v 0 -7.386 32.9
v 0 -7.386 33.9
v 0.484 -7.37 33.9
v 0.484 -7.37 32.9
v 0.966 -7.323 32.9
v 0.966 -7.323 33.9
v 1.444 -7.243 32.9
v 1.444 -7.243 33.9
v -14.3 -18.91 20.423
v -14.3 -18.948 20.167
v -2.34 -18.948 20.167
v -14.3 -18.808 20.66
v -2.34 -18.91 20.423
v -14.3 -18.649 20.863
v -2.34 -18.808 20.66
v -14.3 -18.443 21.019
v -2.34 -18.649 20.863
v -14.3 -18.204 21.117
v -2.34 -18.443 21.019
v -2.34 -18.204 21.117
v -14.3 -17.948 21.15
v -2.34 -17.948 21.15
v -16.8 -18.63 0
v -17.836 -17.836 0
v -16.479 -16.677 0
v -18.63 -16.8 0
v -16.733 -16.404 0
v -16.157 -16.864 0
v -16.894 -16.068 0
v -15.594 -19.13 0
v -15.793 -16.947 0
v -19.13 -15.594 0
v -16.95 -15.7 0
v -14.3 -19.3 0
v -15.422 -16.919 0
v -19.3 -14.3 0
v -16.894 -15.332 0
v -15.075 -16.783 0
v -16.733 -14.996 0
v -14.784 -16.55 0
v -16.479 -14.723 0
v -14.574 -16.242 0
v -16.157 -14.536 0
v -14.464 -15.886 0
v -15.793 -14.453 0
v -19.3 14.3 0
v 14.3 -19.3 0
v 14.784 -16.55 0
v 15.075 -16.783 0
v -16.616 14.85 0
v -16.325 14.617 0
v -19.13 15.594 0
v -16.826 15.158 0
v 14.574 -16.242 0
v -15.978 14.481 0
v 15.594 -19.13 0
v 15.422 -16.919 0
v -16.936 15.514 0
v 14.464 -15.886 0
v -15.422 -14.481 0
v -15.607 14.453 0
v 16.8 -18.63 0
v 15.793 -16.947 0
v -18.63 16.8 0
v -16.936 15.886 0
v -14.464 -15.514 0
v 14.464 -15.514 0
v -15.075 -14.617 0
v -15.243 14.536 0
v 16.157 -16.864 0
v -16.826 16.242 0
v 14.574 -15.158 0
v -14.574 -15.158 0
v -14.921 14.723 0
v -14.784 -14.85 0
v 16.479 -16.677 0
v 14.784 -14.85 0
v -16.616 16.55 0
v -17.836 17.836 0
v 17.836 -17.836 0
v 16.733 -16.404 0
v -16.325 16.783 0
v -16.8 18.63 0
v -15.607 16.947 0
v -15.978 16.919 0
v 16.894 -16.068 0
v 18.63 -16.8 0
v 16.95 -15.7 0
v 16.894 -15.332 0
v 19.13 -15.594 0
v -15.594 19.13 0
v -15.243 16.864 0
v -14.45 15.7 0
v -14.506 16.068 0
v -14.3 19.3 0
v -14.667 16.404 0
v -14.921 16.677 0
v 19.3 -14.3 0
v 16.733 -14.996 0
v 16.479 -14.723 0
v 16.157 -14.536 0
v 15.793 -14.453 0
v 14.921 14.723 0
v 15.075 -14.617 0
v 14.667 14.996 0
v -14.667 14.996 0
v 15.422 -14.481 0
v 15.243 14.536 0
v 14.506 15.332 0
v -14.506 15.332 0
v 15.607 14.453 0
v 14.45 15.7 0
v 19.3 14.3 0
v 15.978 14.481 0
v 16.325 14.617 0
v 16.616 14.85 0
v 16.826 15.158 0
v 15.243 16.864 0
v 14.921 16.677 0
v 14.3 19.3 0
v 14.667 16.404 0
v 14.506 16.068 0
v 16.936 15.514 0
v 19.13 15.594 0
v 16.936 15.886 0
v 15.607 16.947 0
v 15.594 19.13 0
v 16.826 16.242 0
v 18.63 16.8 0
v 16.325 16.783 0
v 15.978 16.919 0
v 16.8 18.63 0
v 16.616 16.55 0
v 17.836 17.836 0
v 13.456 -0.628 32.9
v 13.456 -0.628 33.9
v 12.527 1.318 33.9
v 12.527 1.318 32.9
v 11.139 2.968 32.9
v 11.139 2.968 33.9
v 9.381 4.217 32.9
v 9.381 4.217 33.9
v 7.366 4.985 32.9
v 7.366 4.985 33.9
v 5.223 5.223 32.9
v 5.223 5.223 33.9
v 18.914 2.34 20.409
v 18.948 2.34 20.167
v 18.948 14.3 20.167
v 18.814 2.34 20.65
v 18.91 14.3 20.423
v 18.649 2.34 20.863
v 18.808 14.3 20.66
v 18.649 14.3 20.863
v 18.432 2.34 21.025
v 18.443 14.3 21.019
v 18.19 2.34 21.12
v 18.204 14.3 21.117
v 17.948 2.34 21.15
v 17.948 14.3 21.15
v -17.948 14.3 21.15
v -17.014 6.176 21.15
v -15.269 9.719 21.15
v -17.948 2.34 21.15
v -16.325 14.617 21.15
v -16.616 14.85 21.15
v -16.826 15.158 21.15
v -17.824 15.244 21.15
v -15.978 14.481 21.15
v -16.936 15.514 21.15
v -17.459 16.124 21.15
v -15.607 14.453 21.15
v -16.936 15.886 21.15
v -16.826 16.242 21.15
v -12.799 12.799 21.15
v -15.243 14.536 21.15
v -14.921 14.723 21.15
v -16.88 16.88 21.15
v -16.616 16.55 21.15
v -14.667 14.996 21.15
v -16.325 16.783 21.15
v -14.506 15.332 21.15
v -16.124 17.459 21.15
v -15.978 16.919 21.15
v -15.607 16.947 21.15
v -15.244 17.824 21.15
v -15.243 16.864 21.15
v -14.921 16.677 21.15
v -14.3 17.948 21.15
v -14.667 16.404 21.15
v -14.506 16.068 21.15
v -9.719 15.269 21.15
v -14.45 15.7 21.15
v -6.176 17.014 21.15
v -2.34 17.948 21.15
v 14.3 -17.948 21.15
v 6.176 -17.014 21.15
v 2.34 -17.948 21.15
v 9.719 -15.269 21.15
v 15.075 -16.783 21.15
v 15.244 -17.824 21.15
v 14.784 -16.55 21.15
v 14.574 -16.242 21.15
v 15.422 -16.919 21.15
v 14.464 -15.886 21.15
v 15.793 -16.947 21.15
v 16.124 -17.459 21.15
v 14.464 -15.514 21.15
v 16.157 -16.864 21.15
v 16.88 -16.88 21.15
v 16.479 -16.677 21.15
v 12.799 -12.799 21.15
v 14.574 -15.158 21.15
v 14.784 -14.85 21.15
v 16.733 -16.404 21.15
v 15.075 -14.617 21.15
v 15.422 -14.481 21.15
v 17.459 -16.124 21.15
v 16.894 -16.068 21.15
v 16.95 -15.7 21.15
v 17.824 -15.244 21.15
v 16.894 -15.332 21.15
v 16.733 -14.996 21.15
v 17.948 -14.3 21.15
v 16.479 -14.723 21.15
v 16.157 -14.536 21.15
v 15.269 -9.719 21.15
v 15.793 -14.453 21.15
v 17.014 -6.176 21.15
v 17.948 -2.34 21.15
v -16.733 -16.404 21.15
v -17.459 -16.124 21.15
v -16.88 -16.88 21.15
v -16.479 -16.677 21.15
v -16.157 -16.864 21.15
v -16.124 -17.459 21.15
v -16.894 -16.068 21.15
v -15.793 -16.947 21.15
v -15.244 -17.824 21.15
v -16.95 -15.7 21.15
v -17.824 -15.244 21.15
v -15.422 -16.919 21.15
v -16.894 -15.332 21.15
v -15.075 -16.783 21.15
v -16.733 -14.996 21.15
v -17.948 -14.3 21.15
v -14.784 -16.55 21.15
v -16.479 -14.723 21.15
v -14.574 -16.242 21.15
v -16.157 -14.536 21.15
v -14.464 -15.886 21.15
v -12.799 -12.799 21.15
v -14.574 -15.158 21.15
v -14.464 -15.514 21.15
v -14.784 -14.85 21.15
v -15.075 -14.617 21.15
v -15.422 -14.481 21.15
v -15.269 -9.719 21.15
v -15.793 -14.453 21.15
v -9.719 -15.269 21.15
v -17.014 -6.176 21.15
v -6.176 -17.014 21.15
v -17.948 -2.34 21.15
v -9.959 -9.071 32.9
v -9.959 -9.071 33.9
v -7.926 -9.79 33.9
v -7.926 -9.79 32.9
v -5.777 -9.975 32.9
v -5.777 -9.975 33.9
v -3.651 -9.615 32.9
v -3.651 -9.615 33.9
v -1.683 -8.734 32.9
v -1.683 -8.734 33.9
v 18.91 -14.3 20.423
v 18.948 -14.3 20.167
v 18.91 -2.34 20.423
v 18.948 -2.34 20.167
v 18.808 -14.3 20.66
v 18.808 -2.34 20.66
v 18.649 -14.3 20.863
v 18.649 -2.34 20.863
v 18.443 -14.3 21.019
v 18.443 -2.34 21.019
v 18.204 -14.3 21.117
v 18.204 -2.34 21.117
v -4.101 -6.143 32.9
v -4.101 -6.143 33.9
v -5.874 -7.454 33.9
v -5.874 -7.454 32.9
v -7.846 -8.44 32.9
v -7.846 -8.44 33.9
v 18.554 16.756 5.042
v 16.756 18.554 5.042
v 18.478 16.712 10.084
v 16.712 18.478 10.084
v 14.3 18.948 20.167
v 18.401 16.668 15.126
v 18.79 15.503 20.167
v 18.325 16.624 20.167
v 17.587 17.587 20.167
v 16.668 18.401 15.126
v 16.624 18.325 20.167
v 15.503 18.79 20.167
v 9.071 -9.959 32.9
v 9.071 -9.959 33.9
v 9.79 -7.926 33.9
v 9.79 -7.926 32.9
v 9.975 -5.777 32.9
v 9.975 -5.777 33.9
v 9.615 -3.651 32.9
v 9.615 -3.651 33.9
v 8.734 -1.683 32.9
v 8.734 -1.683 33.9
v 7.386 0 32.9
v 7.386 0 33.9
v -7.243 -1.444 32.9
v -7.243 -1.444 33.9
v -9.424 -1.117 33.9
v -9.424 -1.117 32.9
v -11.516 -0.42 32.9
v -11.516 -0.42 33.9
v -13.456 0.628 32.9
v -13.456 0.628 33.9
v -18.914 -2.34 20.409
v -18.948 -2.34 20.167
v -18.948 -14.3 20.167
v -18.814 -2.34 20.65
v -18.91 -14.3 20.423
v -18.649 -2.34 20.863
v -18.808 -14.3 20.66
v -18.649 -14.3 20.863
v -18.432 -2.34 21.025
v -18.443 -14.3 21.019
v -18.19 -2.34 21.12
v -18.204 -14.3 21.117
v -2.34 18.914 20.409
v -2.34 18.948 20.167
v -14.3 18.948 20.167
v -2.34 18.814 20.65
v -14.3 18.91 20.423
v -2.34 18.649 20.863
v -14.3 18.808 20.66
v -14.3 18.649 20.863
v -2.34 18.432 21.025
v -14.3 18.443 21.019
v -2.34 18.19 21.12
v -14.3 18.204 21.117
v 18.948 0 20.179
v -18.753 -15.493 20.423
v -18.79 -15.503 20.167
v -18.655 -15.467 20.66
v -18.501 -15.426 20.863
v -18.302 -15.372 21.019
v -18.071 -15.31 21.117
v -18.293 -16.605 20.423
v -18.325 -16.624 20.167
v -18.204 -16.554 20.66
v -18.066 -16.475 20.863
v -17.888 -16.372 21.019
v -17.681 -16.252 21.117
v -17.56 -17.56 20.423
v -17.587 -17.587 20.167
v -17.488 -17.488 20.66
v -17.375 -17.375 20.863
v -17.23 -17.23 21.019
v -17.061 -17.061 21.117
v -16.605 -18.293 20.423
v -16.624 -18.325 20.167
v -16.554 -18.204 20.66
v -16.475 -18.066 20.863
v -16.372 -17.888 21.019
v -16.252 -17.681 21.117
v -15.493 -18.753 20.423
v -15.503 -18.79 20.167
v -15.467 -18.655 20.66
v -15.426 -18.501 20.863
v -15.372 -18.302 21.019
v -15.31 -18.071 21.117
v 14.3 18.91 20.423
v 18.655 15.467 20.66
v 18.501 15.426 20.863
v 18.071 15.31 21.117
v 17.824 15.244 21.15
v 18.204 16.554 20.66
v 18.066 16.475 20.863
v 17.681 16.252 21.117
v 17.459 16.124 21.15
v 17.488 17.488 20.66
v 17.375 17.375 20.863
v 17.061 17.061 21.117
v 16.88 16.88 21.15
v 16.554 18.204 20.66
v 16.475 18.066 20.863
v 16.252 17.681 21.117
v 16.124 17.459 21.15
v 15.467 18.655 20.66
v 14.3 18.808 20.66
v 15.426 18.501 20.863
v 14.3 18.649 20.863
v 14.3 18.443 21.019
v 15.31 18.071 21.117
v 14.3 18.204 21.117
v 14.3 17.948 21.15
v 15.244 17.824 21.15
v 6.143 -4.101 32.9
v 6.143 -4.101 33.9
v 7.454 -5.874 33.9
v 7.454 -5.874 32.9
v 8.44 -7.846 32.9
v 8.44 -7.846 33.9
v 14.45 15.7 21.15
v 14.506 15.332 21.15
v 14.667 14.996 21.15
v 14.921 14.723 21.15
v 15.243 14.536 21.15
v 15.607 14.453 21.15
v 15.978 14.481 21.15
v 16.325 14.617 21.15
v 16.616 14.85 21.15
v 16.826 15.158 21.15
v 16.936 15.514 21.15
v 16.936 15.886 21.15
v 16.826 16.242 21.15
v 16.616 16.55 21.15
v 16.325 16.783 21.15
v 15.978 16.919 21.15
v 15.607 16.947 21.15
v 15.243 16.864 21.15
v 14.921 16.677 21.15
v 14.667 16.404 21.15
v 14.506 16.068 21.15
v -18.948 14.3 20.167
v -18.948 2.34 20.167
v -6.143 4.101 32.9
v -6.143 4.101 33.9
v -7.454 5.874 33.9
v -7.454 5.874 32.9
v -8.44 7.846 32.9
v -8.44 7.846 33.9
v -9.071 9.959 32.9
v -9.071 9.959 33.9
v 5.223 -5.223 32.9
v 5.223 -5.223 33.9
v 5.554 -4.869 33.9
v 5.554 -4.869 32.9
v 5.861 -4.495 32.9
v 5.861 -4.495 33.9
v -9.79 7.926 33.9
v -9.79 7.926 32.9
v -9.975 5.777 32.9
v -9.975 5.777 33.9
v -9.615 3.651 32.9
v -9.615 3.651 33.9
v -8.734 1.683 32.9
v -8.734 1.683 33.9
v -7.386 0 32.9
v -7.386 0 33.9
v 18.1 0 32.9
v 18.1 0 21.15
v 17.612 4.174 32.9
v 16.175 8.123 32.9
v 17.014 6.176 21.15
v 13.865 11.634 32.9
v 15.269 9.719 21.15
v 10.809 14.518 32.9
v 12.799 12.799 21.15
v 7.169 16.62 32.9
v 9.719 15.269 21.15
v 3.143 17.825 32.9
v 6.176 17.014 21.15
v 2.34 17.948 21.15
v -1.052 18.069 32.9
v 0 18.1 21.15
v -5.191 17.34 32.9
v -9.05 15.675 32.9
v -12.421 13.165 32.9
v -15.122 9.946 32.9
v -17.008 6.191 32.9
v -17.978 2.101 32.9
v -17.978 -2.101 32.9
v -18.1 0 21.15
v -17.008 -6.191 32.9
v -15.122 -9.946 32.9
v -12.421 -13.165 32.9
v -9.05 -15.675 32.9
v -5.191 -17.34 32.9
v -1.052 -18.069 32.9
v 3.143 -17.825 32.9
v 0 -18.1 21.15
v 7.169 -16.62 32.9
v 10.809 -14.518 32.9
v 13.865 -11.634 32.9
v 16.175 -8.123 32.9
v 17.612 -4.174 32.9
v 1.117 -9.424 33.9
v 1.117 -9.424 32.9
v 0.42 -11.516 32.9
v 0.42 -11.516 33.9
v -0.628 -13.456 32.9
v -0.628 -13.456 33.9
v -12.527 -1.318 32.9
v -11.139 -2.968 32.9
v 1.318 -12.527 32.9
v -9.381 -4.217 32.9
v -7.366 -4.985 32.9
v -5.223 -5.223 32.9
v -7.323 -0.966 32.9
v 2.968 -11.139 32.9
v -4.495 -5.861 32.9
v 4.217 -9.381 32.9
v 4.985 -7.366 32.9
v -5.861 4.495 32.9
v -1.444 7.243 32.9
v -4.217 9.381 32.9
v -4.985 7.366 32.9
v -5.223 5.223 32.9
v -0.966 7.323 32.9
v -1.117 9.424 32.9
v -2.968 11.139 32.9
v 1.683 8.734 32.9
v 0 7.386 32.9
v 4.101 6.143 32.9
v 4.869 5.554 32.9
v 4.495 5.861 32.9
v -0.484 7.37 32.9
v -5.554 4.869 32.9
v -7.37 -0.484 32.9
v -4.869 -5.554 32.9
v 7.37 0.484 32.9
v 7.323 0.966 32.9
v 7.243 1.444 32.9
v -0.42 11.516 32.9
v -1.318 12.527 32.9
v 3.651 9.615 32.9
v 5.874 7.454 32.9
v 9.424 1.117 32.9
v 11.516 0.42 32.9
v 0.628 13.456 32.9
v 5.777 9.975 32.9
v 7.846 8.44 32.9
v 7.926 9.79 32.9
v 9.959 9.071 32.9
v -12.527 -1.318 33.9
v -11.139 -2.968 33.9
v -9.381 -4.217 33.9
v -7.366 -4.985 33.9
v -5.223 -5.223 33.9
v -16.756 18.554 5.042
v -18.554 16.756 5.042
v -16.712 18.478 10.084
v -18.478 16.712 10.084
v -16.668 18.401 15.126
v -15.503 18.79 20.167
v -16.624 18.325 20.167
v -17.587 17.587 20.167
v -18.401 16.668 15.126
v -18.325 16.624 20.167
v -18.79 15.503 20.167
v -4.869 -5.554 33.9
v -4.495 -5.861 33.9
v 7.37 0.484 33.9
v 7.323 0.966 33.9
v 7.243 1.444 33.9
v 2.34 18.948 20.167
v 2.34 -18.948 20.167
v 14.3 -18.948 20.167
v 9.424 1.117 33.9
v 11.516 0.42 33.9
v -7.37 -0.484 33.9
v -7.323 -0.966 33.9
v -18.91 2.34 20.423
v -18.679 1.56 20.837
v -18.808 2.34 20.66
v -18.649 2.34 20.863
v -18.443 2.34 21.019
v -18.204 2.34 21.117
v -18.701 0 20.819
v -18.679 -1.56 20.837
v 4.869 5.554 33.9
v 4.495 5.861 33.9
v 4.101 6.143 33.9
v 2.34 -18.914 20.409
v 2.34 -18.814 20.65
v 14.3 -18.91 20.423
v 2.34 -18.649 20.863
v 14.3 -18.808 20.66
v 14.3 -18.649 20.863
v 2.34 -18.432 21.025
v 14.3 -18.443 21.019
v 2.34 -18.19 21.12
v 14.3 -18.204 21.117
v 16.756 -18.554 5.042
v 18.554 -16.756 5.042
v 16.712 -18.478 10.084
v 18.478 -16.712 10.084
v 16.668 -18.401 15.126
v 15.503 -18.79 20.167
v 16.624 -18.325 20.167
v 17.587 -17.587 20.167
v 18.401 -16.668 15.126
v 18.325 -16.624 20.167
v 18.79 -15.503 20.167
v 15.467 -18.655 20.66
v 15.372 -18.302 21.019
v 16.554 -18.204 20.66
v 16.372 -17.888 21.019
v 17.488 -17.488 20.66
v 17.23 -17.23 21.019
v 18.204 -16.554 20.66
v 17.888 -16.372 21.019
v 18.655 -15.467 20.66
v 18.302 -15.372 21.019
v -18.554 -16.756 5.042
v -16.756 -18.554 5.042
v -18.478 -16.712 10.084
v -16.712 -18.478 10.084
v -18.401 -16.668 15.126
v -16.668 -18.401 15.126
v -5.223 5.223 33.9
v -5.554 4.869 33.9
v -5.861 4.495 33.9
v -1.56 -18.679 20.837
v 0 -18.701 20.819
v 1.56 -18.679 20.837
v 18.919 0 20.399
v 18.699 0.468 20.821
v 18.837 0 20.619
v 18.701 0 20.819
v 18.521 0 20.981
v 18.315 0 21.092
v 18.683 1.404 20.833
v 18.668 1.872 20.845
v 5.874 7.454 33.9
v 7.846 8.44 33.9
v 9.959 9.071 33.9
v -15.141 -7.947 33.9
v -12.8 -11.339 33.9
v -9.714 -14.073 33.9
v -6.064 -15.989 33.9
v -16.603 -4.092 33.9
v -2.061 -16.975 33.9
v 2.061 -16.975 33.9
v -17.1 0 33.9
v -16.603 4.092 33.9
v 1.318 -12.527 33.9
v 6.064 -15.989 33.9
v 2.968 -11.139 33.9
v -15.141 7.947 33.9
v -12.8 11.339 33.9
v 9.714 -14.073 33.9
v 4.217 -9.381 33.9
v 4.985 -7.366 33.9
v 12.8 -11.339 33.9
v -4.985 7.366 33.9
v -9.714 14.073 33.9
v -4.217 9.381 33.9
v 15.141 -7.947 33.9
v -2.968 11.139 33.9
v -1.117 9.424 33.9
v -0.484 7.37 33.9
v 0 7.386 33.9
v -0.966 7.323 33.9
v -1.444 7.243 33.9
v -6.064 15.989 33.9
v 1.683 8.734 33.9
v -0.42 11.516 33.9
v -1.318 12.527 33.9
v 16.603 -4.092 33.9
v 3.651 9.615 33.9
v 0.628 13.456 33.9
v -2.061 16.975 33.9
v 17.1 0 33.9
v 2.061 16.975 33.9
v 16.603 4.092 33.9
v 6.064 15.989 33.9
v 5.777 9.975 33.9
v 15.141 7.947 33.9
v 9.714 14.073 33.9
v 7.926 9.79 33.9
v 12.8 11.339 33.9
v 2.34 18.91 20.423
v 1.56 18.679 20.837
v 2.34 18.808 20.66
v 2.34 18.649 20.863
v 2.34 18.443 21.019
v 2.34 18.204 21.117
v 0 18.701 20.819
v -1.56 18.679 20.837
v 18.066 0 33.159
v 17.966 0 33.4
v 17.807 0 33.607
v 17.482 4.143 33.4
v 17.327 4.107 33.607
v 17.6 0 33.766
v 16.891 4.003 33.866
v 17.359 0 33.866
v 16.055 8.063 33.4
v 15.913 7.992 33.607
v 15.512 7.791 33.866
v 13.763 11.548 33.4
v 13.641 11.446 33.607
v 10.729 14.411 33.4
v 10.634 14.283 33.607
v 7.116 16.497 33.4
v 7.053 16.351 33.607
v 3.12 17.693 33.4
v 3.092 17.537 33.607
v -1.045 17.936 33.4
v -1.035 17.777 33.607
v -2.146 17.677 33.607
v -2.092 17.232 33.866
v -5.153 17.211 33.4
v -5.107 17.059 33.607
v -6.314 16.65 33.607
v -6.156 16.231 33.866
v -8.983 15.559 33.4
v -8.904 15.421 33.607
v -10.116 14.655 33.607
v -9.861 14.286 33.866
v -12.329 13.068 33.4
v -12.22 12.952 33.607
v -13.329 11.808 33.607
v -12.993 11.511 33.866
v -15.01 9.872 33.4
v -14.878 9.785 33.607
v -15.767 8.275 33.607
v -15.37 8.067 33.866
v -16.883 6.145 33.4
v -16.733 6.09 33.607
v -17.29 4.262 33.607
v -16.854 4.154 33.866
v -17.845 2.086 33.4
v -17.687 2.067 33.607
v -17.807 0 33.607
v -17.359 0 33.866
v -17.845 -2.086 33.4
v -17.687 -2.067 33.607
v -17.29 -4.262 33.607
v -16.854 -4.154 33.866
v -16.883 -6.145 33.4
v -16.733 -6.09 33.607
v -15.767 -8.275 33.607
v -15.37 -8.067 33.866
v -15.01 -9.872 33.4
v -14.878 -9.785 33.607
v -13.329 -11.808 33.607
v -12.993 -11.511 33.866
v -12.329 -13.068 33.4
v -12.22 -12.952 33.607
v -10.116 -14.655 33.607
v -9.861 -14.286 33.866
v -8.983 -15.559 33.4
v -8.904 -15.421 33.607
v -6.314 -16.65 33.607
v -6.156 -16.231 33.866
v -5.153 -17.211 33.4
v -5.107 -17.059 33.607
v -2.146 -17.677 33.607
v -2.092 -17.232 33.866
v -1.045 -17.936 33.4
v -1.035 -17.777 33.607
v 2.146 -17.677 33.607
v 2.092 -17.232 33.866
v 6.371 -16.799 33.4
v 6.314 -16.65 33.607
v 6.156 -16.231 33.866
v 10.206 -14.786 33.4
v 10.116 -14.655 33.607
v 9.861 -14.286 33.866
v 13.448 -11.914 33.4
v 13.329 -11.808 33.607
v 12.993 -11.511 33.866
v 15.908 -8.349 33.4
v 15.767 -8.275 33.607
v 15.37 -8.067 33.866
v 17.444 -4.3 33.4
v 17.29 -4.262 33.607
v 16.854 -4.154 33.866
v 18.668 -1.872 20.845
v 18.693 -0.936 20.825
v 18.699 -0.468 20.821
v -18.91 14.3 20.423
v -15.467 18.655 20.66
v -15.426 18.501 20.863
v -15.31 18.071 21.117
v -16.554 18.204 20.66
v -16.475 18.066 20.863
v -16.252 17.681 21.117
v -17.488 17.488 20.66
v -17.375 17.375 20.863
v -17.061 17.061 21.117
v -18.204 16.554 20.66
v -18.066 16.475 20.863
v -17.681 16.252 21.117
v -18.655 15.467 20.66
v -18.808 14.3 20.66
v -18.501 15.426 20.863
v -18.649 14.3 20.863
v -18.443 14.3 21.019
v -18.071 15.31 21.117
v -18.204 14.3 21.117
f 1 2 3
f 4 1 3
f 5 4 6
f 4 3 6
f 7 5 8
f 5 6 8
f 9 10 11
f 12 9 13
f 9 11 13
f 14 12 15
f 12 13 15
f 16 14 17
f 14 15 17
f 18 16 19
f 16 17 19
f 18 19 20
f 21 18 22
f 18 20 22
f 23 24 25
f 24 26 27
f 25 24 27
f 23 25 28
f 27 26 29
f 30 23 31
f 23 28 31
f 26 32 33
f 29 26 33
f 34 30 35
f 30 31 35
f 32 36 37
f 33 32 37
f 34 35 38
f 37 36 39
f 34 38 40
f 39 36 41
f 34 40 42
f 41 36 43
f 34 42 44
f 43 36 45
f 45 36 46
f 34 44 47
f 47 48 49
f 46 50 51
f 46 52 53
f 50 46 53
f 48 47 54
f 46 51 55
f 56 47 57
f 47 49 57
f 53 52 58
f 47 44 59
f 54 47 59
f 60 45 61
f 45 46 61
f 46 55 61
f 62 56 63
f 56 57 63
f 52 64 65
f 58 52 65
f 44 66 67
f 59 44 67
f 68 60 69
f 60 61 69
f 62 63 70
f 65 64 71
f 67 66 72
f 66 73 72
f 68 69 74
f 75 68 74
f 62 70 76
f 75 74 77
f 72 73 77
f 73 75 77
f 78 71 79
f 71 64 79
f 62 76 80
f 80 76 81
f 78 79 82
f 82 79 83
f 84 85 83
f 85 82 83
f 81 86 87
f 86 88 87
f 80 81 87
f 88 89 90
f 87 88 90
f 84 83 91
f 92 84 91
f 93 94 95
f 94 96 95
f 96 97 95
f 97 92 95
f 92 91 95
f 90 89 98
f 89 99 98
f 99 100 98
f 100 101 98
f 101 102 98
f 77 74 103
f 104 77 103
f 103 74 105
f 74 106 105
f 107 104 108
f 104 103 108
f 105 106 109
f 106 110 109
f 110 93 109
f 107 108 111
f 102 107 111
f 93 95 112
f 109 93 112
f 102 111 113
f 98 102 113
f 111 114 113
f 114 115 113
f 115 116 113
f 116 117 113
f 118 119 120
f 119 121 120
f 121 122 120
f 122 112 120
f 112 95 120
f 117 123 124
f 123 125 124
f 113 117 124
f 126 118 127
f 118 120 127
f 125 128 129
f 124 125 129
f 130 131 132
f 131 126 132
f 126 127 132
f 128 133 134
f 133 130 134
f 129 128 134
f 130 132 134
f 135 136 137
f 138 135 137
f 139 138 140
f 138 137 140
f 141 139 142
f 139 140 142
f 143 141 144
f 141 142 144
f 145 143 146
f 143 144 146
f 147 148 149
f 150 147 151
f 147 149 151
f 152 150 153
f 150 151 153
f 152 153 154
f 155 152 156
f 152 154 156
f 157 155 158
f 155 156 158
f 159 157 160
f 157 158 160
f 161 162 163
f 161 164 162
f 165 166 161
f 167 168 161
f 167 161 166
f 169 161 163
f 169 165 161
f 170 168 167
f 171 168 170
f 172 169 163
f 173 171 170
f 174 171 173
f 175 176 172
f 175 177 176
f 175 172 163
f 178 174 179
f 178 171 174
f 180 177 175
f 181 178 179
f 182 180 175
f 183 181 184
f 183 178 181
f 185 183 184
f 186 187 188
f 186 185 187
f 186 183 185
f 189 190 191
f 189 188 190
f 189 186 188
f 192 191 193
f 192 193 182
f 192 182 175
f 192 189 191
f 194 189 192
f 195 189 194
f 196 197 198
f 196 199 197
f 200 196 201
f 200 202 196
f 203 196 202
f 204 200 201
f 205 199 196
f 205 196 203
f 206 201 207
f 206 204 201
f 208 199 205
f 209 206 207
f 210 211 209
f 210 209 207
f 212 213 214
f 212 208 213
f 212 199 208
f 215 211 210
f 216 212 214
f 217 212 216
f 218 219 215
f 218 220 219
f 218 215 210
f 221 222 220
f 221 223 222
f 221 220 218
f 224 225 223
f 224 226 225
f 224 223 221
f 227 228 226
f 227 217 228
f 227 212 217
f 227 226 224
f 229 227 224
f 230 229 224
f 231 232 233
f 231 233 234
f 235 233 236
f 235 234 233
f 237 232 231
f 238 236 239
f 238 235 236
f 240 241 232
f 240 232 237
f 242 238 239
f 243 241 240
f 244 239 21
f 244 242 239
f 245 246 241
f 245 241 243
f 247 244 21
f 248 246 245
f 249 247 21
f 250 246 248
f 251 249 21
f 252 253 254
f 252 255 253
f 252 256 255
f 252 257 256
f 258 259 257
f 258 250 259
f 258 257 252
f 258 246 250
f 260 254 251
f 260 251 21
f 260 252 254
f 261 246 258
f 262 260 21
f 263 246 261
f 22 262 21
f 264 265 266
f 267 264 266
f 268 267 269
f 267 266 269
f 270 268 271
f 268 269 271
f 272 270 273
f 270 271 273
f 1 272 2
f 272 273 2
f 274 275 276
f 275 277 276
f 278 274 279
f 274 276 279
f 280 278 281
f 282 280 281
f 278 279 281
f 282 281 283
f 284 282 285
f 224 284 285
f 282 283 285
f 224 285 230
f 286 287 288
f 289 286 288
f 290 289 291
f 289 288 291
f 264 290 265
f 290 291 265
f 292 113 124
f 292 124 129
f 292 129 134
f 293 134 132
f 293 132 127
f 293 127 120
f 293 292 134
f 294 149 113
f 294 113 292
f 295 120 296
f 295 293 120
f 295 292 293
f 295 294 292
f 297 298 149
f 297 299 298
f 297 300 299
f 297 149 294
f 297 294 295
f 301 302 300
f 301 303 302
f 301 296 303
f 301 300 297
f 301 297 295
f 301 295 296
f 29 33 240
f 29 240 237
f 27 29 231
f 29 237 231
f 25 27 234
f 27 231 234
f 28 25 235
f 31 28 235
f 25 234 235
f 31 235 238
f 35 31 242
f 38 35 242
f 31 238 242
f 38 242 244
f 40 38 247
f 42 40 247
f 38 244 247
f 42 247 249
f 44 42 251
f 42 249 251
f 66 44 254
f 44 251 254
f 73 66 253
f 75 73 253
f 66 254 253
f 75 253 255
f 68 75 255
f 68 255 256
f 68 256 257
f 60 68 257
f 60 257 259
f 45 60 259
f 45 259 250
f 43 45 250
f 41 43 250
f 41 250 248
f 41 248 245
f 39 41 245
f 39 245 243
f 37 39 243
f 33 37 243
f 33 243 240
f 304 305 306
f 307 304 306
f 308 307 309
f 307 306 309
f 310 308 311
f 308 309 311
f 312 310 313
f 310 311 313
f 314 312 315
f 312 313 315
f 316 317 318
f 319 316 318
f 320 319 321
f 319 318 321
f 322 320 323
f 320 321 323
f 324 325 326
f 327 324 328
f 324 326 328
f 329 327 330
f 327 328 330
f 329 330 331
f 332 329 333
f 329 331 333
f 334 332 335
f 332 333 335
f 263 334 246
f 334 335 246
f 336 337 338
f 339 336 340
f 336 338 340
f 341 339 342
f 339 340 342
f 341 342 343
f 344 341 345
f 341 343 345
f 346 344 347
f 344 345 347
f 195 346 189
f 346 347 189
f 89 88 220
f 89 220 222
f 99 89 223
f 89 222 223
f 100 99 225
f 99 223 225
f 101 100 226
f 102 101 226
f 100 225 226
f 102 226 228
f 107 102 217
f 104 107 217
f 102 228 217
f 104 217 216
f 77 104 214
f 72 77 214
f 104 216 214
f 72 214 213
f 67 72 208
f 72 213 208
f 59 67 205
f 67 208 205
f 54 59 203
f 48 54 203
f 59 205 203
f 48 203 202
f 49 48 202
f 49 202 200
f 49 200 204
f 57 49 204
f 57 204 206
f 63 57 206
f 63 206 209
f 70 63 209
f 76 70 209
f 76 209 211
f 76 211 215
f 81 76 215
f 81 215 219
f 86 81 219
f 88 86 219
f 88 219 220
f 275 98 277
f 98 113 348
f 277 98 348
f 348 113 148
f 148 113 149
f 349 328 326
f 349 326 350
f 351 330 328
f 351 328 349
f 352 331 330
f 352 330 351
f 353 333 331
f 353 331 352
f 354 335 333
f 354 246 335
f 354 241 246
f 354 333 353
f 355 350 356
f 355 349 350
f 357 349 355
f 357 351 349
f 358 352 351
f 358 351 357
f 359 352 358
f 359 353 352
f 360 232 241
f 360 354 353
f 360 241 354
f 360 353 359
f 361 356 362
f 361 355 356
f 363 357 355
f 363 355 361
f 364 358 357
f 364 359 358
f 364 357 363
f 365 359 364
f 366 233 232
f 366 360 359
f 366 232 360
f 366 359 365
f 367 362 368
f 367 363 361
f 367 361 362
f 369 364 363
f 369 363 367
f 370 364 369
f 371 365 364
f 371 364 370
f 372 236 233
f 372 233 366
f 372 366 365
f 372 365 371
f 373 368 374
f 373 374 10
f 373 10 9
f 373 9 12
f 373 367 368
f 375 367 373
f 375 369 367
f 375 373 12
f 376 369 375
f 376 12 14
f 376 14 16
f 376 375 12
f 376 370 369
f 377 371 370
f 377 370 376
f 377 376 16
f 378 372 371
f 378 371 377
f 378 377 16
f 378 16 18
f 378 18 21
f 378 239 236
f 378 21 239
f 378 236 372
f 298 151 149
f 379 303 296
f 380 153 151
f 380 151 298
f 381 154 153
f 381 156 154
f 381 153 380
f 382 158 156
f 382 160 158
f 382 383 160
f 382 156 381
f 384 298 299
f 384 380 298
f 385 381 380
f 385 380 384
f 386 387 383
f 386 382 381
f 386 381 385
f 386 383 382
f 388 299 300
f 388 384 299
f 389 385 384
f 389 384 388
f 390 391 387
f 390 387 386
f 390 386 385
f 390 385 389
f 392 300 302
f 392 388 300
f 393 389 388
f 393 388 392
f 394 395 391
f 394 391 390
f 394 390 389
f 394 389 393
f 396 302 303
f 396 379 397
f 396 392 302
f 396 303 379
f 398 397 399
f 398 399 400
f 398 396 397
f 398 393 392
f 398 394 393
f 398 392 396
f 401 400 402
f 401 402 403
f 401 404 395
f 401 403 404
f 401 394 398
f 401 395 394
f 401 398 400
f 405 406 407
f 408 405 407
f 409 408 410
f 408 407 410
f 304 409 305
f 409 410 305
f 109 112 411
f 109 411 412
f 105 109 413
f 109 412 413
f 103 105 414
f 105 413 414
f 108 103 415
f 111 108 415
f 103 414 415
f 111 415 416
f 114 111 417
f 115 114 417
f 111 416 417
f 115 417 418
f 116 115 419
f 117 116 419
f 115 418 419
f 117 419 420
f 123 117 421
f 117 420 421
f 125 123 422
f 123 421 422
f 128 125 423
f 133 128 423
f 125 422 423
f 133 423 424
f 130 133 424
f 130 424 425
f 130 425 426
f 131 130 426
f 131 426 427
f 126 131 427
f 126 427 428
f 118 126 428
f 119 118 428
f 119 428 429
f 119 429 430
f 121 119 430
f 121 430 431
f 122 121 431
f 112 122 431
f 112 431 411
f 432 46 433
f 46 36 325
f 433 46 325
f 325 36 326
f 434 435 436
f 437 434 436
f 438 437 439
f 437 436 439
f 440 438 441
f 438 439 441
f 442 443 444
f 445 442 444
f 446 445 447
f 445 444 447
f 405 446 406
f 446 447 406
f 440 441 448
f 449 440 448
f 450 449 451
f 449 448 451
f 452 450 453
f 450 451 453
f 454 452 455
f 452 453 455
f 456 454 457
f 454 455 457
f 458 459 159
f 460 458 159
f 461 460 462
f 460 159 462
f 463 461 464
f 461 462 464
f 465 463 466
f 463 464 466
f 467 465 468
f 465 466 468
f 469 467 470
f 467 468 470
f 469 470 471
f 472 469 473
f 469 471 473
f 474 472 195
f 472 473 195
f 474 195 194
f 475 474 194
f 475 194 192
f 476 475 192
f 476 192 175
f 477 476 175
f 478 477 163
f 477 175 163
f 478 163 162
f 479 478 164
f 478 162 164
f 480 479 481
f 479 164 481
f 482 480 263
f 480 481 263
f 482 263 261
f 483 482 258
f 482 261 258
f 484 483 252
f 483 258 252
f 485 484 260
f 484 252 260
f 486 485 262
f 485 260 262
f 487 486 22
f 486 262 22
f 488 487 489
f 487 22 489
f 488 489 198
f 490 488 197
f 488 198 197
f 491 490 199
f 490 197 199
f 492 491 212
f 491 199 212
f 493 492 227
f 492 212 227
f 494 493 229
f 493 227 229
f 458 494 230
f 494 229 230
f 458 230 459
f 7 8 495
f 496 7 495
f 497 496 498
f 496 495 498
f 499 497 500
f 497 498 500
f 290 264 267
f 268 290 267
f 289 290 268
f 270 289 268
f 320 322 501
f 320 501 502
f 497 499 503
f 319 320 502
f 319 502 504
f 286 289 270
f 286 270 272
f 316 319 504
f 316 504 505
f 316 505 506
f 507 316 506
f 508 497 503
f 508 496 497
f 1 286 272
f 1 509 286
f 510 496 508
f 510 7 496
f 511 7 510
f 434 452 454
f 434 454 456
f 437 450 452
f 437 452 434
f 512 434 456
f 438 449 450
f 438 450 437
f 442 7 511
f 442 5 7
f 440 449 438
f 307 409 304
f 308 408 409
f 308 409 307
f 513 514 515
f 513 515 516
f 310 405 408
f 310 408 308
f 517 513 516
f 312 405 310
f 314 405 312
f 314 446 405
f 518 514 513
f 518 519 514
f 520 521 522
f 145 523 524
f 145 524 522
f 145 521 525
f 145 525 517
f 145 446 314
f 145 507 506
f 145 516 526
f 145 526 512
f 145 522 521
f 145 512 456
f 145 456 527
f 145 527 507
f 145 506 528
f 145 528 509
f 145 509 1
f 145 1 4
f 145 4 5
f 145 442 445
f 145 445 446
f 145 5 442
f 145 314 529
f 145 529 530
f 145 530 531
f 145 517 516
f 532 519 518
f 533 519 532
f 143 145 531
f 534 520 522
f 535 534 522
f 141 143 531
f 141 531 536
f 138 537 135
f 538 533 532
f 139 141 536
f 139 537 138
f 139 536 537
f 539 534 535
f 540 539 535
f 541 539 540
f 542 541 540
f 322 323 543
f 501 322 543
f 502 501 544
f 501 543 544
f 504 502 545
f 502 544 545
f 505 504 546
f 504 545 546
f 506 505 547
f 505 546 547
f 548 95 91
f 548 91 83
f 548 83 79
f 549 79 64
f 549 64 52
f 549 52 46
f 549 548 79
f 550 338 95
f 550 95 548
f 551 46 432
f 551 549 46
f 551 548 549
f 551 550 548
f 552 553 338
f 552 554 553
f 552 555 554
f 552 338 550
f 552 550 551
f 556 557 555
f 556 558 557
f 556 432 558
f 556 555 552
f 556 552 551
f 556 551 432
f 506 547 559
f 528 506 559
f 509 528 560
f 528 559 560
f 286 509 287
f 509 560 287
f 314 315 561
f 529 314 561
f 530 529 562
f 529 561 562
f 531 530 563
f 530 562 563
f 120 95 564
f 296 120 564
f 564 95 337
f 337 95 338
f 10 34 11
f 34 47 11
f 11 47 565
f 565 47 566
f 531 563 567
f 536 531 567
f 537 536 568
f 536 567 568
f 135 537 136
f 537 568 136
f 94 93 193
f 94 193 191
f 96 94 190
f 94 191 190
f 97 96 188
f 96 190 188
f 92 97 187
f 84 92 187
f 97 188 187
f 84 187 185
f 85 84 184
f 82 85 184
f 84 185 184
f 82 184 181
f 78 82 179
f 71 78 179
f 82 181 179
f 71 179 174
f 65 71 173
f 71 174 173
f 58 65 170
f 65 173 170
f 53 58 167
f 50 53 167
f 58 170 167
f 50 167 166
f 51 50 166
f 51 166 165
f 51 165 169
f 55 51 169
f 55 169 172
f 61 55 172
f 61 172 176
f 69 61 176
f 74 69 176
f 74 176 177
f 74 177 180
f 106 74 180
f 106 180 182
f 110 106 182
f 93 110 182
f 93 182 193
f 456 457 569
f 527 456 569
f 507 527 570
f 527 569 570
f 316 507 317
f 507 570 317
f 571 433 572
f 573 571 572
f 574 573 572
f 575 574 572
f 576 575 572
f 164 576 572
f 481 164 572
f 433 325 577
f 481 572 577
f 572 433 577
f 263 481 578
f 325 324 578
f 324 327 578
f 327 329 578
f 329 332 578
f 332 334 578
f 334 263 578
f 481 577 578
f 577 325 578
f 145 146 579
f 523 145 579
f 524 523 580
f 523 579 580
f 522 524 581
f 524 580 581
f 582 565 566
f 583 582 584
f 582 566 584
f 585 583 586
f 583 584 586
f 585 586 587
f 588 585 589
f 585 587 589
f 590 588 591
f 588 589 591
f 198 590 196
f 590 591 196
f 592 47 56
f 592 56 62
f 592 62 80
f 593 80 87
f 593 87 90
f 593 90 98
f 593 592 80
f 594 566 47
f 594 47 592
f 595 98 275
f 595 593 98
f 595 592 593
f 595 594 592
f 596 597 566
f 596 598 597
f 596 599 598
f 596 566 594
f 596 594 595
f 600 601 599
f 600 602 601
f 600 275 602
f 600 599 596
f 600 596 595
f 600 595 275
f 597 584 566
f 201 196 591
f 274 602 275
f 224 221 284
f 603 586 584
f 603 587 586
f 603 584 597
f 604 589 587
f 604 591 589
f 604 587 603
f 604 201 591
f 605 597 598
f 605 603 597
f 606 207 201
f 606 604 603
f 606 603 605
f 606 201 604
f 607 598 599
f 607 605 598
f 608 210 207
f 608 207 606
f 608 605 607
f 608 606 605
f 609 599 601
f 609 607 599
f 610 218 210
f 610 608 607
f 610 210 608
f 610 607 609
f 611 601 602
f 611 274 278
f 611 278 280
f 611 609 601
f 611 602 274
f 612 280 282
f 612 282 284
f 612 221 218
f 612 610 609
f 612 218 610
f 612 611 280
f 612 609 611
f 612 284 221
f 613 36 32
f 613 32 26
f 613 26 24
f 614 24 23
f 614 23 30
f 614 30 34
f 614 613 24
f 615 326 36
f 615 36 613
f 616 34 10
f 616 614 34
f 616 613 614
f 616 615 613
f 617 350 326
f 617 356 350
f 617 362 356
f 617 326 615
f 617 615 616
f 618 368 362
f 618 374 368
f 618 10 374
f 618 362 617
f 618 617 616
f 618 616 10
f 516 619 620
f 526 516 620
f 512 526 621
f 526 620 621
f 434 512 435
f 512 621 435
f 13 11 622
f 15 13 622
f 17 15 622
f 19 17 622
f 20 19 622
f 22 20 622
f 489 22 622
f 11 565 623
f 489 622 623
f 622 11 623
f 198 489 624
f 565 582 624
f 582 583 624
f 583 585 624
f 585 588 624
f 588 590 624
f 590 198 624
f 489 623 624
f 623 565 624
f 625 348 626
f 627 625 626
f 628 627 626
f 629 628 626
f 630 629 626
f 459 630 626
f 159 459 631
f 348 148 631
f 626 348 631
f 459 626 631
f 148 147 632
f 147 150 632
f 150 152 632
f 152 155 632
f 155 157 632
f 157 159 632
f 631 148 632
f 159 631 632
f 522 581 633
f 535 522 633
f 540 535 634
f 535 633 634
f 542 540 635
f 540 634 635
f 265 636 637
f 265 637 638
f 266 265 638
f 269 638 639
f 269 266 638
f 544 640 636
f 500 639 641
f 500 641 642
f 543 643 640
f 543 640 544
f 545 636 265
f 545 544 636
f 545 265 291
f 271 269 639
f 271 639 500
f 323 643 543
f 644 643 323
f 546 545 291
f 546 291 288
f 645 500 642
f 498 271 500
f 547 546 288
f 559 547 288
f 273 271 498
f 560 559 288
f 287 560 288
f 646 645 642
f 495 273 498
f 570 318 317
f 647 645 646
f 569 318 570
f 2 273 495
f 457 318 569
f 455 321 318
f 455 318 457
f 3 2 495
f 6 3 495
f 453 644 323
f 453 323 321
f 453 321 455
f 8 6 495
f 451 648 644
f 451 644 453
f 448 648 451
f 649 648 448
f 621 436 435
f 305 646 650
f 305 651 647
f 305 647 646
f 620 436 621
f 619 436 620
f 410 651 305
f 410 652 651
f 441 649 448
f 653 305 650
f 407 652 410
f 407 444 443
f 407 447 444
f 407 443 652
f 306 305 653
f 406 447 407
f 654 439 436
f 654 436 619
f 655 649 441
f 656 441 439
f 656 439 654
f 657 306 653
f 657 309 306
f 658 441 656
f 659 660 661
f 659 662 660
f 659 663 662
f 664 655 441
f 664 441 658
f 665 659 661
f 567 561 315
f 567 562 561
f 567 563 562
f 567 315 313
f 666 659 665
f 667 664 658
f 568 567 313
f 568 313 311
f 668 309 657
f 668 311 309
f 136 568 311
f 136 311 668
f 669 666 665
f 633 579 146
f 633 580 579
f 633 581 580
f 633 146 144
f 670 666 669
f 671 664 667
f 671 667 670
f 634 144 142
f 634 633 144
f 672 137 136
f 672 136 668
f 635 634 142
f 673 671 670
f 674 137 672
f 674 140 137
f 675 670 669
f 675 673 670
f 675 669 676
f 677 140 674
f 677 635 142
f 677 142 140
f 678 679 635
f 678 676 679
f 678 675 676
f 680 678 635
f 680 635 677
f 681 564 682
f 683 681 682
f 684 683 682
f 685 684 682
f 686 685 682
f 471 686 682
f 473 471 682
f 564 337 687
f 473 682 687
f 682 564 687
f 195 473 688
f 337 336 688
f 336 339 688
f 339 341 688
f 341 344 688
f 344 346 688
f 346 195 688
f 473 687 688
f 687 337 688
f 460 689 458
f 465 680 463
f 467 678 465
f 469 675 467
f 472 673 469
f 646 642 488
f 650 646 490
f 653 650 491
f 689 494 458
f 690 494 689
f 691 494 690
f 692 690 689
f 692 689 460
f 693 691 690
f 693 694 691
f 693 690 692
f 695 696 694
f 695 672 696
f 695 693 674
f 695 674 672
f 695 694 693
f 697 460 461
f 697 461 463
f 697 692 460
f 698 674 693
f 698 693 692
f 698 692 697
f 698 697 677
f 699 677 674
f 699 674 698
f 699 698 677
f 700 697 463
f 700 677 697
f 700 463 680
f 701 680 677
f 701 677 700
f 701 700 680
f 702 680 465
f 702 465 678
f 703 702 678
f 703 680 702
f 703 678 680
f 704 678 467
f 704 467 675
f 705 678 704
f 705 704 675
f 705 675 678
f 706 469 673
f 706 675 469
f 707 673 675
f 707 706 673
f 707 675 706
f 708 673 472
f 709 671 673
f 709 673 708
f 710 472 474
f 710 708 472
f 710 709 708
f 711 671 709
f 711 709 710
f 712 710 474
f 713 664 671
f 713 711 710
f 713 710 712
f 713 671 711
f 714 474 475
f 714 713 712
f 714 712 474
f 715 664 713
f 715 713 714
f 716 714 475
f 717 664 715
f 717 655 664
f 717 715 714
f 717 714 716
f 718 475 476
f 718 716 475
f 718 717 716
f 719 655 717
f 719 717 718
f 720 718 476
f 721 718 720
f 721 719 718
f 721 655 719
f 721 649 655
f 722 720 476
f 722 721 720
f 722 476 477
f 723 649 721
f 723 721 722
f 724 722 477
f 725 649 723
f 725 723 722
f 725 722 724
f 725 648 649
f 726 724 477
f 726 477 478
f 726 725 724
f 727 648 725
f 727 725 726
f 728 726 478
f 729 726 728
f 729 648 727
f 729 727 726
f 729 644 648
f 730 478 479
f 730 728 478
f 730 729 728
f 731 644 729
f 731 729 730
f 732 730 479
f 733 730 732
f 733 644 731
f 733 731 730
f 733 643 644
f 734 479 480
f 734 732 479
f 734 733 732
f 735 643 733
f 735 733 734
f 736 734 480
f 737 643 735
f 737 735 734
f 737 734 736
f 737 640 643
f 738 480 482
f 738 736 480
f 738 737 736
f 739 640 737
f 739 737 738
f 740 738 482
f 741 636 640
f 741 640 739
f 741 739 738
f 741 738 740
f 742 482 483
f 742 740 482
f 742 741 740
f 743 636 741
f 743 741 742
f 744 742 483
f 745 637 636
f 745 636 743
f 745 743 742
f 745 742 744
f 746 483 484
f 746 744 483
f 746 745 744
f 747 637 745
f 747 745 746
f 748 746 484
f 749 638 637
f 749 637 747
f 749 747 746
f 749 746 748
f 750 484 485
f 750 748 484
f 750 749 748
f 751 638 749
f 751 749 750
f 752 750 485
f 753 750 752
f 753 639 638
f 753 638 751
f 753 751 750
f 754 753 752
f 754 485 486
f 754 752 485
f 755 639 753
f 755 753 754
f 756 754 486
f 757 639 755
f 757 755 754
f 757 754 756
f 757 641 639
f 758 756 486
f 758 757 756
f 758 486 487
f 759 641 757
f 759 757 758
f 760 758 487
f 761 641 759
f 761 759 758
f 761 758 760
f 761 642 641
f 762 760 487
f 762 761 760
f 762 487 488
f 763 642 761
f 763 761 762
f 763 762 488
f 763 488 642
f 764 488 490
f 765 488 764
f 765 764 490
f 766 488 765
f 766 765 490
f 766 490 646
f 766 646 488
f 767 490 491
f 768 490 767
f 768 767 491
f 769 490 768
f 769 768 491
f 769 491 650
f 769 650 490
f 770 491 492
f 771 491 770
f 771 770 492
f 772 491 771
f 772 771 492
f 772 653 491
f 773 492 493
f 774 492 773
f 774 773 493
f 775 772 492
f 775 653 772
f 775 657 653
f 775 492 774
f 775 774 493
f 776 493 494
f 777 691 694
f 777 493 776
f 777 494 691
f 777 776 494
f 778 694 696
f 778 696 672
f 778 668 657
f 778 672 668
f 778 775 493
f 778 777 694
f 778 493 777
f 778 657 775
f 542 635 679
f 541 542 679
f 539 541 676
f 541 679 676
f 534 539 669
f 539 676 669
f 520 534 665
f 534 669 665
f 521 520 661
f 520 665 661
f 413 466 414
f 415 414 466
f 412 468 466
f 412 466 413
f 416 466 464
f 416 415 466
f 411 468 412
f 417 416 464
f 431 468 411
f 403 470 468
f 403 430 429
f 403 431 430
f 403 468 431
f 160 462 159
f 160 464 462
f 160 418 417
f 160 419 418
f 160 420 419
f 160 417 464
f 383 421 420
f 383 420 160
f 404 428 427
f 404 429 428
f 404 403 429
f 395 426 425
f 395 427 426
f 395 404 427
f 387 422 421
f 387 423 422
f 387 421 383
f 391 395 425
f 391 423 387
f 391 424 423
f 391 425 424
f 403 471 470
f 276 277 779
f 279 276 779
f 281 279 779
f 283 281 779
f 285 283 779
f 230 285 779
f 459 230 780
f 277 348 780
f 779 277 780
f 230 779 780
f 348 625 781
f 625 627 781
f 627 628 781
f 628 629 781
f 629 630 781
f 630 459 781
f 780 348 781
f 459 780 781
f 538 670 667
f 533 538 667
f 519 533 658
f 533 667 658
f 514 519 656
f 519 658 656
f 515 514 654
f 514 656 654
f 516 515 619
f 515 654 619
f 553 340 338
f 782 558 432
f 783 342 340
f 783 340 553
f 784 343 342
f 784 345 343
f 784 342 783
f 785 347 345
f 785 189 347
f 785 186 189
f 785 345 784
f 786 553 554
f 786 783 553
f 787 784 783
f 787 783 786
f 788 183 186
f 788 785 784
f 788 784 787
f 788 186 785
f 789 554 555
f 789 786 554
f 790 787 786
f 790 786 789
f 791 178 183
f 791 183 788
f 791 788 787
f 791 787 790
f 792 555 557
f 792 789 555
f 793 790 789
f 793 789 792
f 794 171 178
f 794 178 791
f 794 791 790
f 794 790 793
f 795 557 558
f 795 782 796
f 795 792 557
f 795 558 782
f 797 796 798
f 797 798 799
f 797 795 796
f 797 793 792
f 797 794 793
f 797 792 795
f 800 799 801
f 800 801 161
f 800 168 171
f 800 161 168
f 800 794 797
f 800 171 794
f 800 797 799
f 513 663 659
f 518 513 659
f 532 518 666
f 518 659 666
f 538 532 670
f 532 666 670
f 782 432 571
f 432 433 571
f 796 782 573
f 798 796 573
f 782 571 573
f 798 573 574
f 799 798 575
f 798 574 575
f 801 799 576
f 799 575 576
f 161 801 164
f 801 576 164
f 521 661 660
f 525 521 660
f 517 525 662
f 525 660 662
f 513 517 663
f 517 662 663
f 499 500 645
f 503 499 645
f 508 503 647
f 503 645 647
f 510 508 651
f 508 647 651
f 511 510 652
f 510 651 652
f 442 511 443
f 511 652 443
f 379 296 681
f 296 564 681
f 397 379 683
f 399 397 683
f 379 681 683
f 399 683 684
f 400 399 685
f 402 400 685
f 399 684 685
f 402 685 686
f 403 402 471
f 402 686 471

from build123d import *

# Parameters (mm, degrees)
BOSS_EXTRUDE1_DEPTH = 21.15
BOSS_EXTRUDE1_TAPER = 1
SKETCH2_R           = 18.1
BOSS_EXTRUDE2_DEPTH = 12.75
SKETCH3_R           = 1.25
CUT_EXTRUDE1_DEPTH  = 35.529733564
FILLET1_R           = 1
CUT_EXTRUDE2_DEPTH  = 1
CIRPATTERN1_COUNT   = 8


with BuildPart() as part:
    # Sketch1 → Boss-Extrude1 (new body)
    with BuildSketch(Plane.XY):
        with BuildLine():
            ThreePointArc((-14.3, 19.3), (-17.835533906, 17.835533906), (-19.3, 14.3))
            Line((-19.3, 14.3), (-19.3, -14.3))
            ThreePointArc((-19.3, -14.3), (-17.835533906, -17.835533906), (-14.3, -19.3))
            Line((-14.3, -19.3), (14.3, -19.3))
            ThreePointArc((14.3, -19.3), (17.835533906, -17.835533906), (19.3, -14.3))
            Line((19.3, -14.3), (19.3, 14.3))
            ThreePointArc((19.3, 14.3), (17.835533906, 17.835533906), (14.3, 19.3))
            Line((14.3, 19.3), (-14.3, 19.3))
        make_face()
    extrude(amount=BOSS_EXTRUDE1_DEPTH, taper=BOSS_EXTRUDE1_TAPER)

    # Sketch2 → Boss-Extrude2 (add)
    with BuildSketch(Plane.XY.offset(21.15)):
        Circle(SKETCH2_R)
    extrude(amount=BOSS_EXTRUDE2_DEPTH)

    # Sketch3 → Cut-Extrude1 (cut, through all)
    with BuildSketch(Plane.XY.offset(21.15)):
        with Locations((-15.7, 15.7)):
            Circle(SKETCH3_R)
        with Locations(Location((15.7, 15.7, 0), (0, 0, 180))):
            Circle(SKETCH3_R)
        with Locations((15.7, -15.7)):
            Circle(SKETCH3_R)
        with Locations(Location((-15.7, -15.7, 0), (0, 0, 180))):
            Circle(SKETCH3_R)
    extrude(amount=-CUT_EXTRUDE1_DEPTH, mode=Mode.SUBTRACT)

    # Fillet1
    fillet1_edges = [part.edges().sort_by_distance(p)[0] for p in [
        (17.574488026, -17.574488026, 21.15),
        (18.930825377, 0, 21.15),
        (17.574488026, 17.574488026, 21.15),
        (0, 18.930825377, 21.15),
        (-17.574488026, 17.574488026, 21.15),
        (-18.1, 0, 33.9),
        (-18.930825377, 0, 21.15),
        (-17.574488026, -17.574488026, 21.15),
        (0, -18.930825377, 21.15),
    ]]
    fillet(fillet1_edges, radius=FILLET1_R)

    # Sketch4 → Cut-Extrude2 (cut)
    with BuildSketch(Plane.XY.offset(33.9)):
        with BuildLine():
            ThreePointArc((0, 7.385996988), (-2.142431463, -7.068446712), (4.100641433, 6.143101118))
            ThreePointArc((4.100641433, 6.143101118), (6.838415629, 7.989504917), (9.958635041, 9.070636436))
            ThreePointArc((9.958635041, 9.070636436), (4.702829161, 9.862759424), (0, 7.385996988))
        make_face()
    cut_extrude2 = extrude(amount=-CUT_EXTRUDE2_DEPTH, mode=Mode.SUBTRACT)

    # CirPattern1: Cut-Extrude2 ×8 about axis
    cirpattern1_axis = Axis((0, 0, 0), (0, 0, 1))
    for i in range(1, CIRPATTERN1_COUNT):
        add(cut_extrude2.rotate(cirpattern1_axis, i * 360 / CIRPATTERN1_COUNT), mode=Mode.SUBTRACT)


solid = part.part
